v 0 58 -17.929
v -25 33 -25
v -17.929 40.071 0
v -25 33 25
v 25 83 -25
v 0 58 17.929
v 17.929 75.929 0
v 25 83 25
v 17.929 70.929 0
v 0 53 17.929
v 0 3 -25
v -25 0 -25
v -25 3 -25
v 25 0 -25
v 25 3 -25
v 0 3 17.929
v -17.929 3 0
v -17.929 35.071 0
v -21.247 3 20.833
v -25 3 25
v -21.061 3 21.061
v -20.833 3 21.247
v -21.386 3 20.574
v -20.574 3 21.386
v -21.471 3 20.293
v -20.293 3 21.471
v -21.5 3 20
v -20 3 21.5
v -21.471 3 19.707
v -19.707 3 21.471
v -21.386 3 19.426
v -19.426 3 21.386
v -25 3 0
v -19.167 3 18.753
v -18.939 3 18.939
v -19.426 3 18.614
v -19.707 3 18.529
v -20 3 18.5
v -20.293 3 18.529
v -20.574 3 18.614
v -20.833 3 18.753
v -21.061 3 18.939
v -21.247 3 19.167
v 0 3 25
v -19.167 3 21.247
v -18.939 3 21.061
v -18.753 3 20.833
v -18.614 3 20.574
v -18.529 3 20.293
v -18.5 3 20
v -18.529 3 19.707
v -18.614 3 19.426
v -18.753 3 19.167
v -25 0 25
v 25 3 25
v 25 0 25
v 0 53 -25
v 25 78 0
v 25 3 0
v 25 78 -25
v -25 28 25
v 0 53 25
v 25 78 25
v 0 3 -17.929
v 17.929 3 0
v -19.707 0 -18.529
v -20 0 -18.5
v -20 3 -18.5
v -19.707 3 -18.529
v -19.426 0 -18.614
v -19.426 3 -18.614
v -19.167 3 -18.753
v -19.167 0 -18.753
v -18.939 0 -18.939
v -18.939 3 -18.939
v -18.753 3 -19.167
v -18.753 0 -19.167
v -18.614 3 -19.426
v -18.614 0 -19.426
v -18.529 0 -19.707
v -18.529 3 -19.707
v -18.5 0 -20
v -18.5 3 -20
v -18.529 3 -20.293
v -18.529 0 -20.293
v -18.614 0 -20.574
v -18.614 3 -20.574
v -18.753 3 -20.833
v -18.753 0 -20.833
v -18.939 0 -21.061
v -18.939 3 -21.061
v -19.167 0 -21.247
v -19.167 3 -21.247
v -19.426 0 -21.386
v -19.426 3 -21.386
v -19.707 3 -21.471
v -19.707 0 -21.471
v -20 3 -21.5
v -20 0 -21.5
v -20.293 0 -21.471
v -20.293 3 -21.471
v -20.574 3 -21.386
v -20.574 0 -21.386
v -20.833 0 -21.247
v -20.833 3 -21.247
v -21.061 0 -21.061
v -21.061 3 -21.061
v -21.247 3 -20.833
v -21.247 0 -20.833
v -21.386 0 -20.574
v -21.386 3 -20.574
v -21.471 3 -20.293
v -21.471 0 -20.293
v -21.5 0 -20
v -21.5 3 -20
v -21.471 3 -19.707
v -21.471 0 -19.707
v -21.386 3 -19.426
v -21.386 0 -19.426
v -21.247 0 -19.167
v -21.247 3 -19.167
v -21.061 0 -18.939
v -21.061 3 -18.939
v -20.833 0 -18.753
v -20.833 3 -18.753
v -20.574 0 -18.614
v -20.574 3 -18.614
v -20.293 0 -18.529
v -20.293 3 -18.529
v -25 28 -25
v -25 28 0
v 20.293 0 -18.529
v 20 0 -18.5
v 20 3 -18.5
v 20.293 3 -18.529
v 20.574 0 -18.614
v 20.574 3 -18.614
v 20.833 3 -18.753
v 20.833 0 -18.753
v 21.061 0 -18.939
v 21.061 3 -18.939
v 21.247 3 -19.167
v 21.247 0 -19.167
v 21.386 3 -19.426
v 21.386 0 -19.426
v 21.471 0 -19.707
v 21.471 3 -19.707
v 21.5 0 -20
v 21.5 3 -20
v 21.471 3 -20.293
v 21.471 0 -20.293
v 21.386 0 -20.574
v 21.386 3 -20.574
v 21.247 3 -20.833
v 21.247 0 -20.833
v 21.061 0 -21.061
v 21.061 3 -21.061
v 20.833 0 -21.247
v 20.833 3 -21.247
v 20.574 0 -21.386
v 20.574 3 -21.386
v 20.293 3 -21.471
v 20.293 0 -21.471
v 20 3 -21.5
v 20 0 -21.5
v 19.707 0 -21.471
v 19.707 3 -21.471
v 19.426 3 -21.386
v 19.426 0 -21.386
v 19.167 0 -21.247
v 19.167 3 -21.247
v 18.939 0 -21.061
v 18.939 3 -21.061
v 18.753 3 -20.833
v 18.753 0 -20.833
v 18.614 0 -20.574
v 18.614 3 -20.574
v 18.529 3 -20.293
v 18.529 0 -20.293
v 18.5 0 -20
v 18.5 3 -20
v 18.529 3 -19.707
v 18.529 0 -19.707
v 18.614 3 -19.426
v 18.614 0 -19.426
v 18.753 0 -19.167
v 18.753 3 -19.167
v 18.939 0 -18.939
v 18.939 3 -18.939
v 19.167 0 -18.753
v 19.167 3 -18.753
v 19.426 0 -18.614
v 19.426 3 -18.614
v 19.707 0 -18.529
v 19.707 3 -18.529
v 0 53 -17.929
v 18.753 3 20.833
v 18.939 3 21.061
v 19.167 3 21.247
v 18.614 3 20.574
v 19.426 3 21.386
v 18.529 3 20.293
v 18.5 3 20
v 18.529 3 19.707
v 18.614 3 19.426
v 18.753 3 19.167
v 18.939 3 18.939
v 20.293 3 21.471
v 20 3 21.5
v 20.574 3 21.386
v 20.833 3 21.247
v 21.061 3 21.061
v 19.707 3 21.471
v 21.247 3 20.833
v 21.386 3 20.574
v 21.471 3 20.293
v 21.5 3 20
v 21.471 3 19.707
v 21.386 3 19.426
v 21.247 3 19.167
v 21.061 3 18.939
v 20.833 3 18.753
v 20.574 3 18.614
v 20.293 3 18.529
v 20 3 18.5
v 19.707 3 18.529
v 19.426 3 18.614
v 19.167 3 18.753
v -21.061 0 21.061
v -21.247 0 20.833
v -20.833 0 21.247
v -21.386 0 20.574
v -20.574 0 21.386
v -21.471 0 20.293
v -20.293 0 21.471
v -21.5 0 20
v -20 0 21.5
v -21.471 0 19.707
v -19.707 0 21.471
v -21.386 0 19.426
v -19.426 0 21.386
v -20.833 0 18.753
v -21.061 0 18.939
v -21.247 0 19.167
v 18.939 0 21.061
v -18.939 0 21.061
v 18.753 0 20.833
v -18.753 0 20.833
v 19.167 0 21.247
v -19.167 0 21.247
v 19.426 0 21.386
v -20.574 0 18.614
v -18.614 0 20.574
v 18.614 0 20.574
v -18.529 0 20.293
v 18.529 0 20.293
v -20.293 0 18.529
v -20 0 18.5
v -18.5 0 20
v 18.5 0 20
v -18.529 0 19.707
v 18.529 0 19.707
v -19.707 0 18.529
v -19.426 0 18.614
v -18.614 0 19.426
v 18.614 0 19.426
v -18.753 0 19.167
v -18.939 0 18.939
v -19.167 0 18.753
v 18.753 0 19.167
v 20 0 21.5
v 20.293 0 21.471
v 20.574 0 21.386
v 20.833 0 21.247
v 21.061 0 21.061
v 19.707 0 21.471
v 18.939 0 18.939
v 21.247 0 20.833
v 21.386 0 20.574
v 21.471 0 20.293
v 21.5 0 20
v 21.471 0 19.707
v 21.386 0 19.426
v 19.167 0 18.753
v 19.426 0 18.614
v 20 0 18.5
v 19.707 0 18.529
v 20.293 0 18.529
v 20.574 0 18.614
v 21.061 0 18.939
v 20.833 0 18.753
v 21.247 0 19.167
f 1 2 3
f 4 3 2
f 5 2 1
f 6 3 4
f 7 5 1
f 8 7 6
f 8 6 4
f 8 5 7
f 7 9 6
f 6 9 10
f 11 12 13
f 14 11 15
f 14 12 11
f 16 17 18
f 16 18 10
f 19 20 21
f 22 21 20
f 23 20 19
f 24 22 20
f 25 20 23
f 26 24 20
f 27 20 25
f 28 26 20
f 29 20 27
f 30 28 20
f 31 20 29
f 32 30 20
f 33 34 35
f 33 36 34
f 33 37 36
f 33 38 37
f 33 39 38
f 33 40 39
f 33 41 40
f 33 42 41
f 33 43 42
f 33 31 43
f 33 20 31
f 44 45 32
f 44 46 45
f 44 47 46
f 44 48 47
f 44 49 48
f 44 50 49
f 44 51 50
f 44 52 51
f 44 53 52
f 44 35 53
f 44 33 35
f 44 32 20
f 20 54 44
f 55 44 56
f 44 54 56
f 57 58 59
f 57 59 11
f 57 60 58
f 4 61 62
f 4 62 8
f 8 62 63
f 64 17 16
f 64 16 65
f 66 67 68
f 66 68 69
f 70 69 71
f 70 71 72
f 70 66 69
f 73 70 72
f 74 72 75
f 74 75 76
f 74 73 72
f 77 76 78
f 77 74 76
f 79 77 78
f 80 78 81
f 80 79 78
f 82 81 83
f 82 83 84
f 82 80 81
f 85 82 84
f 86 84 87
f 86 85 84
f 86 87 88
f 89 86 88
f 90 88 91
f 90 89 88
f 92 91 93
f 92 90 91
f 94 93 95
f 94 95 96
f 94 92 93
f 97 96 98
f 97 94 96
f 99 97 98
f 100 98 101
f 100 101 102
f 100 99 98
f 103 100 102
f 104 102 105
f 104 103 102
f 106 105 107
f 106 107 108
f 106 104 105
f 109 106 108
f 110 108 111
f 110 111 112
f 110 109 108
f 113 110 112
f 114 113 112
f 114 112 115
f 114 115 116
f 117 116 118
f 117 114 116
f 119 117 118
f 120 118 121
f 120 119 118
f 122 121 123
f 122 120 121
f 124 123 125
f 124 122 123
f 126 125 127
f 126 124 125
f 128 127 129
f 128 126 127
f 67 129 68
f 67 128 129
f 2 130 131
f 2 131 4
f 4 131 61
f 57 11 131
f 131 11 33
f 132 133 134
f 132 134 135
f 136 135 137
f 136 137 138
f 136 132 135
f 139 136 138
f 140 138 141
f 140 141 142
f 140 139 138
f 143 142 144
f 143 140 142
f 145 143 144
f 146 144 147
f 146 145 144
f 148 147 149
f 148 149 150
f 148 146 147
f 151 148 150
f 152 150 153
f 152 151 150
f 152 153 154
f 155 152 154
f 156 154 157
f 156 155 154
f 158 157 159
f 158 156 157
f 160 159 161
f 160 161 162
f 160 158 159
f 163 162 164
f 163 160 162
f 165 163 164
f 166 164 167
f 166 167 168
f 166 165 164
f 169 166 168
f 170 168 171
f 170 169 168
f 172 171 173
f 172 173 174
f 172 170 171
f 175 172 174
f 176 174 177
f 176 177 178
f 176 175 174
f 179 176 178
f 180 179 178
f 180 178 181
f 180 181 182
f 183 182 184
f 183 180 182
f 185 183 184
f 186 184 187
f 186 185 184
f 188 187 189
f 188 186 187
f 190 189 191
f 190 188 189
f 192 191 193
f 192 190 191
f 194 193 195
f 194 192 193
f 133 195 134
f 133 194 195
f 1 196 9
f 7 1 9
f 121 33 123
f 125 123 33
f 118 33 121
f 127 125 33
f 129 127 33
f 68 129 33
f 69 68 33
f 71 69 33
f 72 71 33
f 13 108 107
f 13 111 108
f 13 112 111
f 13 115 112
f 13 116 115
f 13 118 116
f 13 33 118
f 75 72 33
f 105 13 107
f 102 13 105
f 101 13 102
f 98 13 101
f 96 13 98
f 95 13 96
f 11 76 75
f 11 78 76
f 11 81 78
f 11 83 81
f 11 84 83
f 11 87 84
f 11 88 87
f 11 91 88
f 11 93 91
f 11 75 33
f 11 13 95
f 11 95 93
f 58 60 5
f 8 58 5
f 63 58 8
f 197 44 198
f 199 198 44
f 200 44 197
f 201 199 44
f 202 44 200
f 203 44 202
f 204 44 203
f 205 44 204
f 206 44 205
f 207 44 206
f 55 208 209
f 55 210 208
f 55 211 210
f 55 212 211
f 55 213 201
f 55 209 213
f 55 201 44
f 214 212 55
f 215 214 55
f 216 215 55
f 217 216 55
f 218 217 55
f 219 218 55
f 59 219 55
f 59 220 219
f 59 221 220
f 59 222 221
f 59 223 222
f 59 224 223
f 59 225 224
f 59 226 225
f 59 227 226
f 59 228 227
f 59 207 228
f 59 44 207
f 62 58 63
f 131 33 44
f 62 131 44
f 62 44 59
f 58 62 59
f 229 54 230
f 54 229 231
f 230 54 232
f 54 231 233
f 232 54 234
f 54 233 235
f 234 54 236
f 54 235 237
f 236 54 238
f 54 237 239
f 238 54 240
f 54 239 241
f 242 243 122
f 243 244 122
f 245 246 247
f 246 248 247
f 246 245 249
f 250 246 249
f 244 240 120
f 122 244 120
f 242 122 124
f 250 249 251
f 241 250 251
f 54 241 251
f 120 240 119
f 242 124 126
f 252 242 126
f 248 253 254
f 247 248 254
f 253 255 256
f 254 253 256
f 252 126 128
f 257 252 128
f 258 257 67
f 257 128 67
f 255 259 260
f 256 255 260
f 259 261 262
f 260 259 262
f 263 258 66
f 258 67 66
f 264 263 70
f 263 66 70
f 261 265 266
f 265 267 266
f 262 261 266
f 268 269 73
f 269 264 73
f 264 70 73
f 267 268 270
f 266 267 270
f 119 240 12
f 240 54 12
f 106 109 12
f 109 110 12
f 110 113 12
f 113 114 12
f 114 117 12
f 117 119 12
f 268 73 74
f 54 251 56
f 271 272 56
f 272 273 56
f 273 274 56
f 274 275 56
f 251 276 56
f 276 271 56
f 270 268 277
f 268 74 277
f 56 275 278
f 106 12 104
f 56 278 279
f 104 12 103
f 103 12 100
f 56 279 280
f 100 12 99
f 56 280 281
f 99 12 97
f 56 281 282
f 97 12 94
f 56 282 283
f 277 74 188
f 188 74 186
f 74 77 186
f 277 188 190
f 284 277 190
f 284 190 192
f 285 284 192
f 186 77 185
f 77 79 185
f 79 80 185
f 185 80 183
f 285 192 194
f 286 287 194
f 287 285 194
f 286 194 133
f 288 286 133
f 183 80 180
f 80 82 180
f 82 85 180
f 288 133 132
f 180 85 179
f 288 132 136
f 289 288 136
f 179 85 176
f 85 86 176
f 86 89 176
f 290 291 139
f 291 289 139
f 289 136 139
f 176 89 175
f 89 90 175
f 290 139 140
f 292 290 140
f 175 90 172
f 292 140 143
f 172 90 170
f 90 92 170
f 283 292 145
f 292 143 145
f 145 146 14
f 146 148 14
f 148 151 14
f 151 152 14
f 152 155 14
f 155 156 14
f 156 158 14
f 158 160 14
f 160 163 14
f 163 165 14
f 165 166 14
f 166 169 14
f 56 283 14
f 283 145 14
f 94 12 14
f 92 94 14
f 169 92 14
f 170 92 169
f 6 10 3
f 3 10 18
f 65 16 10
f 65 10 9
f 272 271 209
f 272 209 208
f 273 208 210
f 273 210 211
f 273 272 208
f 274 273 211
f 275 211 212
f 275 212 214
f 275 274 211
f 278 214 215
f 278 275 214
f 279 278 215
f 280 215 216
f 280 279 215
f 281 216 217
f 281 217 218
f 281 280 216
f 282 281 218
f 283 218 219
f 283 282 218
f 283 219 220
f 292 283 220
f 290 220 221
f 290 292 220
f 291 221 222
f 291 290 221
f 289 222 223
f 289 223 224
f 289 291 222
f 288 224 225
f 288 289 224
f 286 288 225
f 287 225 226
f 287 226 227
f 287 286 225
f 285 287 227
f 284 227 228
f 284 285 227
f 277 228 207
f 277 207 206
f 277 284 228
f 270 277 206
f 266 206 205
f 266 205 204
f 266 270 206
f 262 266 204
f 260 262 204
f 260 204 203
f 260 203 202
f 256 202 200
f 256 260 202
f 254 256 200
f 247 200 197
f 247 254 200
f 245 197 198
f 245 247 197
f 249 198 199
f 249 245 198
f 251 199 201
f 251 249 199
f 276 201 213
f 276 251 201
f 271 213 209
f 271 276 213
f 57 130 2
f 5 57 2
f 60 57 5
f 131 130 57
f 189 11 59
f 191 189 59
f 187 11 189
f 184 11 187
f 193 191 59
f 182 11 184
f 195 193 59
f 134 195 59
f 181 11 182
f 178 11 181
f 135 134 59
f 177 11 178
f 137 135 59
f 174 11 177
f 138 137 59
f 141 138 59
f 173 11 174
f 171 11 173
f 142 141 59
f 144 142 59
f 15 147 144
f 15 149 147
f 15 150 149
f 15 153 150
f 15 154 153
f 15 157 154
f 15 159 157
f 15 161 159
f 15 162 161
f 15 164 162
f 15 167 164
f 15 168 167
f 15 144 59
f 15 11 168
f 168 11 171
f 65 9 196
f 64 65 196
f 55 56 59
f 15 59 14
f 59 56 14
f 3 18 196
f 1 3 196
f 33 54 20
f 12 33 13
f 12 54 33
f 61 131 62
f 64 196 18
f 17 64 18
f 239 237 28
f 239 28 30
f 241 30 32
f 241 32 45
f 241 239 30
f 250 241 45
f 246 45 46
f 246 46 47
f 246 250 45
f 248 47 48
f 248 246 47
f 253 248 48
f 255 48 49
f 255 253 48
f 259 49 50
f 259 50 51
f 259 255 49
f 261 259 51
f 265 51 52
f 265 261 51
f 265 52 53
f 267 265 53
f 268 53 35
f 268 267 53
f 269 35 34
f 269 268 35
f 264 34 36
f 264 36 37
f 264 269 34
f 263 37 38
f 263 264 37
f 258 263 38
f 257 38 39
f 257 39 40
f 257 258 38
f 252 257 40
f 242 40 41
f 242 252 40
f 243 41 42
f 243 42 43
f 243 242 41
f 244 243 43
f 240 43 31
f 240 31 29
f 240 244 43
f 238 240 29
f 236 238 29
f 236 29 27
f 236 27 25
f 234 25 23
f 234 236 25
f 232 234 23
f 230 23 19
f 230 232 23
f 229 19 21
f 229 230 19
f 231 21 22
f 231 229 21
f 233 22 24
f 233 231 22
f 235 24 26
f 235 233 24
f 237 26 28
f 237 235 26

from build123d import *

# Parameters (mm, degrees)
SKETCH1_W           = 50
SKETCH1_H           = 50
SKETCH1_R           = 1.5
BOSS_EXTRUDE1_DEPTH = 3
BOSS_EXTRUDE2_DEPTH = 75
CUT_EXTRUDE1_DEPTH  = 96.963534741
SKETCH4_W           = 50
SKETCH4_H           = 70.710678118
BOSS_EXTRUDE3_DEPTH = 5


with BuildPart() as part:
    # Sketch1 → Boss-Extrude1 (new body)
    with BuildSketch(Plane(origin=(0, 0, 0), x_dir=(1, 0, 0), z_dir=(0, 1, 0))):
        Rectangle(SKETCH1_W, SKETCH1_H)
        with Locations(Location((-20, -20, 0), (0, 0, 270))):
            Circle(SKETCH1_R, mode=Mode.SUBTRACT)
        with Locations(Location((-20, 20, 0), (0, 0, 270))):
            Circle(SKETCH1_R, mode=Mode.SUBTRACT)
        with Locations(Location((20, 20, 0), (0, 0, 270))):
            Circle(SKETCH1_R, mode=Mode.SUBTRACT)
        with Locations(Location((20, -20, 0), (0, 0, 270))):
            Circle(SKETCH1_R, mode=Mode.SUBTRACT)
    extrude(amount=BOSS_EXTRUDE1_DEPTH)

    # Sketch2 → Boss-Extrude2 (add)
    with BuildSketch(Plane(origin=(0, 3, 0), x_dir=(1, 0, 0), z_dir=(0, 1, 0))):
        Polygon((0, 25), (-25, 0), (0, -25), (25, 0), align=None)
        Polygon((0, 17.928932188), (-17.928932188, 0), (0, -17.928932188), (17.928932188, 0), align=None, mode=Mode.SUBTRACT)
    extrude(amount=BOSS_EXTRUDE2_DEPTH)

    # Sketch3 → Cut-Extrude1 (cut, through all)
    with BuildSketch(Plane.XY.offset(25)):
        Polygon((25, 78), (-25, 78), (-25, 28), align=None)
    extrude(amount=-CUT_EXTRUDE1_DEPTH, mode=Mode.SUBTRACT)

    # Sketch4 → Boss-Extrude3 (add, along a direction that is not the sketch's normal)
    with BuildSketch(Plane(origin=(-26.5, 26.5, 0), x_dir=(0, 0, 1), z_dir=(-0.7071067811865438, 0.7071067811865513, 0))):
        with Locations((0, 37.476659403)):
            Rectangle(SKETCH4_W, SKETCH4_H)
        Polygon((-17.928932188, 37.476659403), (0, 62.831998462), (17.928932188, 37.476659403), (0, 12.121320344), align=None, mode=Mode.SUBTRACT)
    extrude(amount=BOSS_EXTRUDE3_DEPTH, dir=(0, 1, 0))


solid = part.part
